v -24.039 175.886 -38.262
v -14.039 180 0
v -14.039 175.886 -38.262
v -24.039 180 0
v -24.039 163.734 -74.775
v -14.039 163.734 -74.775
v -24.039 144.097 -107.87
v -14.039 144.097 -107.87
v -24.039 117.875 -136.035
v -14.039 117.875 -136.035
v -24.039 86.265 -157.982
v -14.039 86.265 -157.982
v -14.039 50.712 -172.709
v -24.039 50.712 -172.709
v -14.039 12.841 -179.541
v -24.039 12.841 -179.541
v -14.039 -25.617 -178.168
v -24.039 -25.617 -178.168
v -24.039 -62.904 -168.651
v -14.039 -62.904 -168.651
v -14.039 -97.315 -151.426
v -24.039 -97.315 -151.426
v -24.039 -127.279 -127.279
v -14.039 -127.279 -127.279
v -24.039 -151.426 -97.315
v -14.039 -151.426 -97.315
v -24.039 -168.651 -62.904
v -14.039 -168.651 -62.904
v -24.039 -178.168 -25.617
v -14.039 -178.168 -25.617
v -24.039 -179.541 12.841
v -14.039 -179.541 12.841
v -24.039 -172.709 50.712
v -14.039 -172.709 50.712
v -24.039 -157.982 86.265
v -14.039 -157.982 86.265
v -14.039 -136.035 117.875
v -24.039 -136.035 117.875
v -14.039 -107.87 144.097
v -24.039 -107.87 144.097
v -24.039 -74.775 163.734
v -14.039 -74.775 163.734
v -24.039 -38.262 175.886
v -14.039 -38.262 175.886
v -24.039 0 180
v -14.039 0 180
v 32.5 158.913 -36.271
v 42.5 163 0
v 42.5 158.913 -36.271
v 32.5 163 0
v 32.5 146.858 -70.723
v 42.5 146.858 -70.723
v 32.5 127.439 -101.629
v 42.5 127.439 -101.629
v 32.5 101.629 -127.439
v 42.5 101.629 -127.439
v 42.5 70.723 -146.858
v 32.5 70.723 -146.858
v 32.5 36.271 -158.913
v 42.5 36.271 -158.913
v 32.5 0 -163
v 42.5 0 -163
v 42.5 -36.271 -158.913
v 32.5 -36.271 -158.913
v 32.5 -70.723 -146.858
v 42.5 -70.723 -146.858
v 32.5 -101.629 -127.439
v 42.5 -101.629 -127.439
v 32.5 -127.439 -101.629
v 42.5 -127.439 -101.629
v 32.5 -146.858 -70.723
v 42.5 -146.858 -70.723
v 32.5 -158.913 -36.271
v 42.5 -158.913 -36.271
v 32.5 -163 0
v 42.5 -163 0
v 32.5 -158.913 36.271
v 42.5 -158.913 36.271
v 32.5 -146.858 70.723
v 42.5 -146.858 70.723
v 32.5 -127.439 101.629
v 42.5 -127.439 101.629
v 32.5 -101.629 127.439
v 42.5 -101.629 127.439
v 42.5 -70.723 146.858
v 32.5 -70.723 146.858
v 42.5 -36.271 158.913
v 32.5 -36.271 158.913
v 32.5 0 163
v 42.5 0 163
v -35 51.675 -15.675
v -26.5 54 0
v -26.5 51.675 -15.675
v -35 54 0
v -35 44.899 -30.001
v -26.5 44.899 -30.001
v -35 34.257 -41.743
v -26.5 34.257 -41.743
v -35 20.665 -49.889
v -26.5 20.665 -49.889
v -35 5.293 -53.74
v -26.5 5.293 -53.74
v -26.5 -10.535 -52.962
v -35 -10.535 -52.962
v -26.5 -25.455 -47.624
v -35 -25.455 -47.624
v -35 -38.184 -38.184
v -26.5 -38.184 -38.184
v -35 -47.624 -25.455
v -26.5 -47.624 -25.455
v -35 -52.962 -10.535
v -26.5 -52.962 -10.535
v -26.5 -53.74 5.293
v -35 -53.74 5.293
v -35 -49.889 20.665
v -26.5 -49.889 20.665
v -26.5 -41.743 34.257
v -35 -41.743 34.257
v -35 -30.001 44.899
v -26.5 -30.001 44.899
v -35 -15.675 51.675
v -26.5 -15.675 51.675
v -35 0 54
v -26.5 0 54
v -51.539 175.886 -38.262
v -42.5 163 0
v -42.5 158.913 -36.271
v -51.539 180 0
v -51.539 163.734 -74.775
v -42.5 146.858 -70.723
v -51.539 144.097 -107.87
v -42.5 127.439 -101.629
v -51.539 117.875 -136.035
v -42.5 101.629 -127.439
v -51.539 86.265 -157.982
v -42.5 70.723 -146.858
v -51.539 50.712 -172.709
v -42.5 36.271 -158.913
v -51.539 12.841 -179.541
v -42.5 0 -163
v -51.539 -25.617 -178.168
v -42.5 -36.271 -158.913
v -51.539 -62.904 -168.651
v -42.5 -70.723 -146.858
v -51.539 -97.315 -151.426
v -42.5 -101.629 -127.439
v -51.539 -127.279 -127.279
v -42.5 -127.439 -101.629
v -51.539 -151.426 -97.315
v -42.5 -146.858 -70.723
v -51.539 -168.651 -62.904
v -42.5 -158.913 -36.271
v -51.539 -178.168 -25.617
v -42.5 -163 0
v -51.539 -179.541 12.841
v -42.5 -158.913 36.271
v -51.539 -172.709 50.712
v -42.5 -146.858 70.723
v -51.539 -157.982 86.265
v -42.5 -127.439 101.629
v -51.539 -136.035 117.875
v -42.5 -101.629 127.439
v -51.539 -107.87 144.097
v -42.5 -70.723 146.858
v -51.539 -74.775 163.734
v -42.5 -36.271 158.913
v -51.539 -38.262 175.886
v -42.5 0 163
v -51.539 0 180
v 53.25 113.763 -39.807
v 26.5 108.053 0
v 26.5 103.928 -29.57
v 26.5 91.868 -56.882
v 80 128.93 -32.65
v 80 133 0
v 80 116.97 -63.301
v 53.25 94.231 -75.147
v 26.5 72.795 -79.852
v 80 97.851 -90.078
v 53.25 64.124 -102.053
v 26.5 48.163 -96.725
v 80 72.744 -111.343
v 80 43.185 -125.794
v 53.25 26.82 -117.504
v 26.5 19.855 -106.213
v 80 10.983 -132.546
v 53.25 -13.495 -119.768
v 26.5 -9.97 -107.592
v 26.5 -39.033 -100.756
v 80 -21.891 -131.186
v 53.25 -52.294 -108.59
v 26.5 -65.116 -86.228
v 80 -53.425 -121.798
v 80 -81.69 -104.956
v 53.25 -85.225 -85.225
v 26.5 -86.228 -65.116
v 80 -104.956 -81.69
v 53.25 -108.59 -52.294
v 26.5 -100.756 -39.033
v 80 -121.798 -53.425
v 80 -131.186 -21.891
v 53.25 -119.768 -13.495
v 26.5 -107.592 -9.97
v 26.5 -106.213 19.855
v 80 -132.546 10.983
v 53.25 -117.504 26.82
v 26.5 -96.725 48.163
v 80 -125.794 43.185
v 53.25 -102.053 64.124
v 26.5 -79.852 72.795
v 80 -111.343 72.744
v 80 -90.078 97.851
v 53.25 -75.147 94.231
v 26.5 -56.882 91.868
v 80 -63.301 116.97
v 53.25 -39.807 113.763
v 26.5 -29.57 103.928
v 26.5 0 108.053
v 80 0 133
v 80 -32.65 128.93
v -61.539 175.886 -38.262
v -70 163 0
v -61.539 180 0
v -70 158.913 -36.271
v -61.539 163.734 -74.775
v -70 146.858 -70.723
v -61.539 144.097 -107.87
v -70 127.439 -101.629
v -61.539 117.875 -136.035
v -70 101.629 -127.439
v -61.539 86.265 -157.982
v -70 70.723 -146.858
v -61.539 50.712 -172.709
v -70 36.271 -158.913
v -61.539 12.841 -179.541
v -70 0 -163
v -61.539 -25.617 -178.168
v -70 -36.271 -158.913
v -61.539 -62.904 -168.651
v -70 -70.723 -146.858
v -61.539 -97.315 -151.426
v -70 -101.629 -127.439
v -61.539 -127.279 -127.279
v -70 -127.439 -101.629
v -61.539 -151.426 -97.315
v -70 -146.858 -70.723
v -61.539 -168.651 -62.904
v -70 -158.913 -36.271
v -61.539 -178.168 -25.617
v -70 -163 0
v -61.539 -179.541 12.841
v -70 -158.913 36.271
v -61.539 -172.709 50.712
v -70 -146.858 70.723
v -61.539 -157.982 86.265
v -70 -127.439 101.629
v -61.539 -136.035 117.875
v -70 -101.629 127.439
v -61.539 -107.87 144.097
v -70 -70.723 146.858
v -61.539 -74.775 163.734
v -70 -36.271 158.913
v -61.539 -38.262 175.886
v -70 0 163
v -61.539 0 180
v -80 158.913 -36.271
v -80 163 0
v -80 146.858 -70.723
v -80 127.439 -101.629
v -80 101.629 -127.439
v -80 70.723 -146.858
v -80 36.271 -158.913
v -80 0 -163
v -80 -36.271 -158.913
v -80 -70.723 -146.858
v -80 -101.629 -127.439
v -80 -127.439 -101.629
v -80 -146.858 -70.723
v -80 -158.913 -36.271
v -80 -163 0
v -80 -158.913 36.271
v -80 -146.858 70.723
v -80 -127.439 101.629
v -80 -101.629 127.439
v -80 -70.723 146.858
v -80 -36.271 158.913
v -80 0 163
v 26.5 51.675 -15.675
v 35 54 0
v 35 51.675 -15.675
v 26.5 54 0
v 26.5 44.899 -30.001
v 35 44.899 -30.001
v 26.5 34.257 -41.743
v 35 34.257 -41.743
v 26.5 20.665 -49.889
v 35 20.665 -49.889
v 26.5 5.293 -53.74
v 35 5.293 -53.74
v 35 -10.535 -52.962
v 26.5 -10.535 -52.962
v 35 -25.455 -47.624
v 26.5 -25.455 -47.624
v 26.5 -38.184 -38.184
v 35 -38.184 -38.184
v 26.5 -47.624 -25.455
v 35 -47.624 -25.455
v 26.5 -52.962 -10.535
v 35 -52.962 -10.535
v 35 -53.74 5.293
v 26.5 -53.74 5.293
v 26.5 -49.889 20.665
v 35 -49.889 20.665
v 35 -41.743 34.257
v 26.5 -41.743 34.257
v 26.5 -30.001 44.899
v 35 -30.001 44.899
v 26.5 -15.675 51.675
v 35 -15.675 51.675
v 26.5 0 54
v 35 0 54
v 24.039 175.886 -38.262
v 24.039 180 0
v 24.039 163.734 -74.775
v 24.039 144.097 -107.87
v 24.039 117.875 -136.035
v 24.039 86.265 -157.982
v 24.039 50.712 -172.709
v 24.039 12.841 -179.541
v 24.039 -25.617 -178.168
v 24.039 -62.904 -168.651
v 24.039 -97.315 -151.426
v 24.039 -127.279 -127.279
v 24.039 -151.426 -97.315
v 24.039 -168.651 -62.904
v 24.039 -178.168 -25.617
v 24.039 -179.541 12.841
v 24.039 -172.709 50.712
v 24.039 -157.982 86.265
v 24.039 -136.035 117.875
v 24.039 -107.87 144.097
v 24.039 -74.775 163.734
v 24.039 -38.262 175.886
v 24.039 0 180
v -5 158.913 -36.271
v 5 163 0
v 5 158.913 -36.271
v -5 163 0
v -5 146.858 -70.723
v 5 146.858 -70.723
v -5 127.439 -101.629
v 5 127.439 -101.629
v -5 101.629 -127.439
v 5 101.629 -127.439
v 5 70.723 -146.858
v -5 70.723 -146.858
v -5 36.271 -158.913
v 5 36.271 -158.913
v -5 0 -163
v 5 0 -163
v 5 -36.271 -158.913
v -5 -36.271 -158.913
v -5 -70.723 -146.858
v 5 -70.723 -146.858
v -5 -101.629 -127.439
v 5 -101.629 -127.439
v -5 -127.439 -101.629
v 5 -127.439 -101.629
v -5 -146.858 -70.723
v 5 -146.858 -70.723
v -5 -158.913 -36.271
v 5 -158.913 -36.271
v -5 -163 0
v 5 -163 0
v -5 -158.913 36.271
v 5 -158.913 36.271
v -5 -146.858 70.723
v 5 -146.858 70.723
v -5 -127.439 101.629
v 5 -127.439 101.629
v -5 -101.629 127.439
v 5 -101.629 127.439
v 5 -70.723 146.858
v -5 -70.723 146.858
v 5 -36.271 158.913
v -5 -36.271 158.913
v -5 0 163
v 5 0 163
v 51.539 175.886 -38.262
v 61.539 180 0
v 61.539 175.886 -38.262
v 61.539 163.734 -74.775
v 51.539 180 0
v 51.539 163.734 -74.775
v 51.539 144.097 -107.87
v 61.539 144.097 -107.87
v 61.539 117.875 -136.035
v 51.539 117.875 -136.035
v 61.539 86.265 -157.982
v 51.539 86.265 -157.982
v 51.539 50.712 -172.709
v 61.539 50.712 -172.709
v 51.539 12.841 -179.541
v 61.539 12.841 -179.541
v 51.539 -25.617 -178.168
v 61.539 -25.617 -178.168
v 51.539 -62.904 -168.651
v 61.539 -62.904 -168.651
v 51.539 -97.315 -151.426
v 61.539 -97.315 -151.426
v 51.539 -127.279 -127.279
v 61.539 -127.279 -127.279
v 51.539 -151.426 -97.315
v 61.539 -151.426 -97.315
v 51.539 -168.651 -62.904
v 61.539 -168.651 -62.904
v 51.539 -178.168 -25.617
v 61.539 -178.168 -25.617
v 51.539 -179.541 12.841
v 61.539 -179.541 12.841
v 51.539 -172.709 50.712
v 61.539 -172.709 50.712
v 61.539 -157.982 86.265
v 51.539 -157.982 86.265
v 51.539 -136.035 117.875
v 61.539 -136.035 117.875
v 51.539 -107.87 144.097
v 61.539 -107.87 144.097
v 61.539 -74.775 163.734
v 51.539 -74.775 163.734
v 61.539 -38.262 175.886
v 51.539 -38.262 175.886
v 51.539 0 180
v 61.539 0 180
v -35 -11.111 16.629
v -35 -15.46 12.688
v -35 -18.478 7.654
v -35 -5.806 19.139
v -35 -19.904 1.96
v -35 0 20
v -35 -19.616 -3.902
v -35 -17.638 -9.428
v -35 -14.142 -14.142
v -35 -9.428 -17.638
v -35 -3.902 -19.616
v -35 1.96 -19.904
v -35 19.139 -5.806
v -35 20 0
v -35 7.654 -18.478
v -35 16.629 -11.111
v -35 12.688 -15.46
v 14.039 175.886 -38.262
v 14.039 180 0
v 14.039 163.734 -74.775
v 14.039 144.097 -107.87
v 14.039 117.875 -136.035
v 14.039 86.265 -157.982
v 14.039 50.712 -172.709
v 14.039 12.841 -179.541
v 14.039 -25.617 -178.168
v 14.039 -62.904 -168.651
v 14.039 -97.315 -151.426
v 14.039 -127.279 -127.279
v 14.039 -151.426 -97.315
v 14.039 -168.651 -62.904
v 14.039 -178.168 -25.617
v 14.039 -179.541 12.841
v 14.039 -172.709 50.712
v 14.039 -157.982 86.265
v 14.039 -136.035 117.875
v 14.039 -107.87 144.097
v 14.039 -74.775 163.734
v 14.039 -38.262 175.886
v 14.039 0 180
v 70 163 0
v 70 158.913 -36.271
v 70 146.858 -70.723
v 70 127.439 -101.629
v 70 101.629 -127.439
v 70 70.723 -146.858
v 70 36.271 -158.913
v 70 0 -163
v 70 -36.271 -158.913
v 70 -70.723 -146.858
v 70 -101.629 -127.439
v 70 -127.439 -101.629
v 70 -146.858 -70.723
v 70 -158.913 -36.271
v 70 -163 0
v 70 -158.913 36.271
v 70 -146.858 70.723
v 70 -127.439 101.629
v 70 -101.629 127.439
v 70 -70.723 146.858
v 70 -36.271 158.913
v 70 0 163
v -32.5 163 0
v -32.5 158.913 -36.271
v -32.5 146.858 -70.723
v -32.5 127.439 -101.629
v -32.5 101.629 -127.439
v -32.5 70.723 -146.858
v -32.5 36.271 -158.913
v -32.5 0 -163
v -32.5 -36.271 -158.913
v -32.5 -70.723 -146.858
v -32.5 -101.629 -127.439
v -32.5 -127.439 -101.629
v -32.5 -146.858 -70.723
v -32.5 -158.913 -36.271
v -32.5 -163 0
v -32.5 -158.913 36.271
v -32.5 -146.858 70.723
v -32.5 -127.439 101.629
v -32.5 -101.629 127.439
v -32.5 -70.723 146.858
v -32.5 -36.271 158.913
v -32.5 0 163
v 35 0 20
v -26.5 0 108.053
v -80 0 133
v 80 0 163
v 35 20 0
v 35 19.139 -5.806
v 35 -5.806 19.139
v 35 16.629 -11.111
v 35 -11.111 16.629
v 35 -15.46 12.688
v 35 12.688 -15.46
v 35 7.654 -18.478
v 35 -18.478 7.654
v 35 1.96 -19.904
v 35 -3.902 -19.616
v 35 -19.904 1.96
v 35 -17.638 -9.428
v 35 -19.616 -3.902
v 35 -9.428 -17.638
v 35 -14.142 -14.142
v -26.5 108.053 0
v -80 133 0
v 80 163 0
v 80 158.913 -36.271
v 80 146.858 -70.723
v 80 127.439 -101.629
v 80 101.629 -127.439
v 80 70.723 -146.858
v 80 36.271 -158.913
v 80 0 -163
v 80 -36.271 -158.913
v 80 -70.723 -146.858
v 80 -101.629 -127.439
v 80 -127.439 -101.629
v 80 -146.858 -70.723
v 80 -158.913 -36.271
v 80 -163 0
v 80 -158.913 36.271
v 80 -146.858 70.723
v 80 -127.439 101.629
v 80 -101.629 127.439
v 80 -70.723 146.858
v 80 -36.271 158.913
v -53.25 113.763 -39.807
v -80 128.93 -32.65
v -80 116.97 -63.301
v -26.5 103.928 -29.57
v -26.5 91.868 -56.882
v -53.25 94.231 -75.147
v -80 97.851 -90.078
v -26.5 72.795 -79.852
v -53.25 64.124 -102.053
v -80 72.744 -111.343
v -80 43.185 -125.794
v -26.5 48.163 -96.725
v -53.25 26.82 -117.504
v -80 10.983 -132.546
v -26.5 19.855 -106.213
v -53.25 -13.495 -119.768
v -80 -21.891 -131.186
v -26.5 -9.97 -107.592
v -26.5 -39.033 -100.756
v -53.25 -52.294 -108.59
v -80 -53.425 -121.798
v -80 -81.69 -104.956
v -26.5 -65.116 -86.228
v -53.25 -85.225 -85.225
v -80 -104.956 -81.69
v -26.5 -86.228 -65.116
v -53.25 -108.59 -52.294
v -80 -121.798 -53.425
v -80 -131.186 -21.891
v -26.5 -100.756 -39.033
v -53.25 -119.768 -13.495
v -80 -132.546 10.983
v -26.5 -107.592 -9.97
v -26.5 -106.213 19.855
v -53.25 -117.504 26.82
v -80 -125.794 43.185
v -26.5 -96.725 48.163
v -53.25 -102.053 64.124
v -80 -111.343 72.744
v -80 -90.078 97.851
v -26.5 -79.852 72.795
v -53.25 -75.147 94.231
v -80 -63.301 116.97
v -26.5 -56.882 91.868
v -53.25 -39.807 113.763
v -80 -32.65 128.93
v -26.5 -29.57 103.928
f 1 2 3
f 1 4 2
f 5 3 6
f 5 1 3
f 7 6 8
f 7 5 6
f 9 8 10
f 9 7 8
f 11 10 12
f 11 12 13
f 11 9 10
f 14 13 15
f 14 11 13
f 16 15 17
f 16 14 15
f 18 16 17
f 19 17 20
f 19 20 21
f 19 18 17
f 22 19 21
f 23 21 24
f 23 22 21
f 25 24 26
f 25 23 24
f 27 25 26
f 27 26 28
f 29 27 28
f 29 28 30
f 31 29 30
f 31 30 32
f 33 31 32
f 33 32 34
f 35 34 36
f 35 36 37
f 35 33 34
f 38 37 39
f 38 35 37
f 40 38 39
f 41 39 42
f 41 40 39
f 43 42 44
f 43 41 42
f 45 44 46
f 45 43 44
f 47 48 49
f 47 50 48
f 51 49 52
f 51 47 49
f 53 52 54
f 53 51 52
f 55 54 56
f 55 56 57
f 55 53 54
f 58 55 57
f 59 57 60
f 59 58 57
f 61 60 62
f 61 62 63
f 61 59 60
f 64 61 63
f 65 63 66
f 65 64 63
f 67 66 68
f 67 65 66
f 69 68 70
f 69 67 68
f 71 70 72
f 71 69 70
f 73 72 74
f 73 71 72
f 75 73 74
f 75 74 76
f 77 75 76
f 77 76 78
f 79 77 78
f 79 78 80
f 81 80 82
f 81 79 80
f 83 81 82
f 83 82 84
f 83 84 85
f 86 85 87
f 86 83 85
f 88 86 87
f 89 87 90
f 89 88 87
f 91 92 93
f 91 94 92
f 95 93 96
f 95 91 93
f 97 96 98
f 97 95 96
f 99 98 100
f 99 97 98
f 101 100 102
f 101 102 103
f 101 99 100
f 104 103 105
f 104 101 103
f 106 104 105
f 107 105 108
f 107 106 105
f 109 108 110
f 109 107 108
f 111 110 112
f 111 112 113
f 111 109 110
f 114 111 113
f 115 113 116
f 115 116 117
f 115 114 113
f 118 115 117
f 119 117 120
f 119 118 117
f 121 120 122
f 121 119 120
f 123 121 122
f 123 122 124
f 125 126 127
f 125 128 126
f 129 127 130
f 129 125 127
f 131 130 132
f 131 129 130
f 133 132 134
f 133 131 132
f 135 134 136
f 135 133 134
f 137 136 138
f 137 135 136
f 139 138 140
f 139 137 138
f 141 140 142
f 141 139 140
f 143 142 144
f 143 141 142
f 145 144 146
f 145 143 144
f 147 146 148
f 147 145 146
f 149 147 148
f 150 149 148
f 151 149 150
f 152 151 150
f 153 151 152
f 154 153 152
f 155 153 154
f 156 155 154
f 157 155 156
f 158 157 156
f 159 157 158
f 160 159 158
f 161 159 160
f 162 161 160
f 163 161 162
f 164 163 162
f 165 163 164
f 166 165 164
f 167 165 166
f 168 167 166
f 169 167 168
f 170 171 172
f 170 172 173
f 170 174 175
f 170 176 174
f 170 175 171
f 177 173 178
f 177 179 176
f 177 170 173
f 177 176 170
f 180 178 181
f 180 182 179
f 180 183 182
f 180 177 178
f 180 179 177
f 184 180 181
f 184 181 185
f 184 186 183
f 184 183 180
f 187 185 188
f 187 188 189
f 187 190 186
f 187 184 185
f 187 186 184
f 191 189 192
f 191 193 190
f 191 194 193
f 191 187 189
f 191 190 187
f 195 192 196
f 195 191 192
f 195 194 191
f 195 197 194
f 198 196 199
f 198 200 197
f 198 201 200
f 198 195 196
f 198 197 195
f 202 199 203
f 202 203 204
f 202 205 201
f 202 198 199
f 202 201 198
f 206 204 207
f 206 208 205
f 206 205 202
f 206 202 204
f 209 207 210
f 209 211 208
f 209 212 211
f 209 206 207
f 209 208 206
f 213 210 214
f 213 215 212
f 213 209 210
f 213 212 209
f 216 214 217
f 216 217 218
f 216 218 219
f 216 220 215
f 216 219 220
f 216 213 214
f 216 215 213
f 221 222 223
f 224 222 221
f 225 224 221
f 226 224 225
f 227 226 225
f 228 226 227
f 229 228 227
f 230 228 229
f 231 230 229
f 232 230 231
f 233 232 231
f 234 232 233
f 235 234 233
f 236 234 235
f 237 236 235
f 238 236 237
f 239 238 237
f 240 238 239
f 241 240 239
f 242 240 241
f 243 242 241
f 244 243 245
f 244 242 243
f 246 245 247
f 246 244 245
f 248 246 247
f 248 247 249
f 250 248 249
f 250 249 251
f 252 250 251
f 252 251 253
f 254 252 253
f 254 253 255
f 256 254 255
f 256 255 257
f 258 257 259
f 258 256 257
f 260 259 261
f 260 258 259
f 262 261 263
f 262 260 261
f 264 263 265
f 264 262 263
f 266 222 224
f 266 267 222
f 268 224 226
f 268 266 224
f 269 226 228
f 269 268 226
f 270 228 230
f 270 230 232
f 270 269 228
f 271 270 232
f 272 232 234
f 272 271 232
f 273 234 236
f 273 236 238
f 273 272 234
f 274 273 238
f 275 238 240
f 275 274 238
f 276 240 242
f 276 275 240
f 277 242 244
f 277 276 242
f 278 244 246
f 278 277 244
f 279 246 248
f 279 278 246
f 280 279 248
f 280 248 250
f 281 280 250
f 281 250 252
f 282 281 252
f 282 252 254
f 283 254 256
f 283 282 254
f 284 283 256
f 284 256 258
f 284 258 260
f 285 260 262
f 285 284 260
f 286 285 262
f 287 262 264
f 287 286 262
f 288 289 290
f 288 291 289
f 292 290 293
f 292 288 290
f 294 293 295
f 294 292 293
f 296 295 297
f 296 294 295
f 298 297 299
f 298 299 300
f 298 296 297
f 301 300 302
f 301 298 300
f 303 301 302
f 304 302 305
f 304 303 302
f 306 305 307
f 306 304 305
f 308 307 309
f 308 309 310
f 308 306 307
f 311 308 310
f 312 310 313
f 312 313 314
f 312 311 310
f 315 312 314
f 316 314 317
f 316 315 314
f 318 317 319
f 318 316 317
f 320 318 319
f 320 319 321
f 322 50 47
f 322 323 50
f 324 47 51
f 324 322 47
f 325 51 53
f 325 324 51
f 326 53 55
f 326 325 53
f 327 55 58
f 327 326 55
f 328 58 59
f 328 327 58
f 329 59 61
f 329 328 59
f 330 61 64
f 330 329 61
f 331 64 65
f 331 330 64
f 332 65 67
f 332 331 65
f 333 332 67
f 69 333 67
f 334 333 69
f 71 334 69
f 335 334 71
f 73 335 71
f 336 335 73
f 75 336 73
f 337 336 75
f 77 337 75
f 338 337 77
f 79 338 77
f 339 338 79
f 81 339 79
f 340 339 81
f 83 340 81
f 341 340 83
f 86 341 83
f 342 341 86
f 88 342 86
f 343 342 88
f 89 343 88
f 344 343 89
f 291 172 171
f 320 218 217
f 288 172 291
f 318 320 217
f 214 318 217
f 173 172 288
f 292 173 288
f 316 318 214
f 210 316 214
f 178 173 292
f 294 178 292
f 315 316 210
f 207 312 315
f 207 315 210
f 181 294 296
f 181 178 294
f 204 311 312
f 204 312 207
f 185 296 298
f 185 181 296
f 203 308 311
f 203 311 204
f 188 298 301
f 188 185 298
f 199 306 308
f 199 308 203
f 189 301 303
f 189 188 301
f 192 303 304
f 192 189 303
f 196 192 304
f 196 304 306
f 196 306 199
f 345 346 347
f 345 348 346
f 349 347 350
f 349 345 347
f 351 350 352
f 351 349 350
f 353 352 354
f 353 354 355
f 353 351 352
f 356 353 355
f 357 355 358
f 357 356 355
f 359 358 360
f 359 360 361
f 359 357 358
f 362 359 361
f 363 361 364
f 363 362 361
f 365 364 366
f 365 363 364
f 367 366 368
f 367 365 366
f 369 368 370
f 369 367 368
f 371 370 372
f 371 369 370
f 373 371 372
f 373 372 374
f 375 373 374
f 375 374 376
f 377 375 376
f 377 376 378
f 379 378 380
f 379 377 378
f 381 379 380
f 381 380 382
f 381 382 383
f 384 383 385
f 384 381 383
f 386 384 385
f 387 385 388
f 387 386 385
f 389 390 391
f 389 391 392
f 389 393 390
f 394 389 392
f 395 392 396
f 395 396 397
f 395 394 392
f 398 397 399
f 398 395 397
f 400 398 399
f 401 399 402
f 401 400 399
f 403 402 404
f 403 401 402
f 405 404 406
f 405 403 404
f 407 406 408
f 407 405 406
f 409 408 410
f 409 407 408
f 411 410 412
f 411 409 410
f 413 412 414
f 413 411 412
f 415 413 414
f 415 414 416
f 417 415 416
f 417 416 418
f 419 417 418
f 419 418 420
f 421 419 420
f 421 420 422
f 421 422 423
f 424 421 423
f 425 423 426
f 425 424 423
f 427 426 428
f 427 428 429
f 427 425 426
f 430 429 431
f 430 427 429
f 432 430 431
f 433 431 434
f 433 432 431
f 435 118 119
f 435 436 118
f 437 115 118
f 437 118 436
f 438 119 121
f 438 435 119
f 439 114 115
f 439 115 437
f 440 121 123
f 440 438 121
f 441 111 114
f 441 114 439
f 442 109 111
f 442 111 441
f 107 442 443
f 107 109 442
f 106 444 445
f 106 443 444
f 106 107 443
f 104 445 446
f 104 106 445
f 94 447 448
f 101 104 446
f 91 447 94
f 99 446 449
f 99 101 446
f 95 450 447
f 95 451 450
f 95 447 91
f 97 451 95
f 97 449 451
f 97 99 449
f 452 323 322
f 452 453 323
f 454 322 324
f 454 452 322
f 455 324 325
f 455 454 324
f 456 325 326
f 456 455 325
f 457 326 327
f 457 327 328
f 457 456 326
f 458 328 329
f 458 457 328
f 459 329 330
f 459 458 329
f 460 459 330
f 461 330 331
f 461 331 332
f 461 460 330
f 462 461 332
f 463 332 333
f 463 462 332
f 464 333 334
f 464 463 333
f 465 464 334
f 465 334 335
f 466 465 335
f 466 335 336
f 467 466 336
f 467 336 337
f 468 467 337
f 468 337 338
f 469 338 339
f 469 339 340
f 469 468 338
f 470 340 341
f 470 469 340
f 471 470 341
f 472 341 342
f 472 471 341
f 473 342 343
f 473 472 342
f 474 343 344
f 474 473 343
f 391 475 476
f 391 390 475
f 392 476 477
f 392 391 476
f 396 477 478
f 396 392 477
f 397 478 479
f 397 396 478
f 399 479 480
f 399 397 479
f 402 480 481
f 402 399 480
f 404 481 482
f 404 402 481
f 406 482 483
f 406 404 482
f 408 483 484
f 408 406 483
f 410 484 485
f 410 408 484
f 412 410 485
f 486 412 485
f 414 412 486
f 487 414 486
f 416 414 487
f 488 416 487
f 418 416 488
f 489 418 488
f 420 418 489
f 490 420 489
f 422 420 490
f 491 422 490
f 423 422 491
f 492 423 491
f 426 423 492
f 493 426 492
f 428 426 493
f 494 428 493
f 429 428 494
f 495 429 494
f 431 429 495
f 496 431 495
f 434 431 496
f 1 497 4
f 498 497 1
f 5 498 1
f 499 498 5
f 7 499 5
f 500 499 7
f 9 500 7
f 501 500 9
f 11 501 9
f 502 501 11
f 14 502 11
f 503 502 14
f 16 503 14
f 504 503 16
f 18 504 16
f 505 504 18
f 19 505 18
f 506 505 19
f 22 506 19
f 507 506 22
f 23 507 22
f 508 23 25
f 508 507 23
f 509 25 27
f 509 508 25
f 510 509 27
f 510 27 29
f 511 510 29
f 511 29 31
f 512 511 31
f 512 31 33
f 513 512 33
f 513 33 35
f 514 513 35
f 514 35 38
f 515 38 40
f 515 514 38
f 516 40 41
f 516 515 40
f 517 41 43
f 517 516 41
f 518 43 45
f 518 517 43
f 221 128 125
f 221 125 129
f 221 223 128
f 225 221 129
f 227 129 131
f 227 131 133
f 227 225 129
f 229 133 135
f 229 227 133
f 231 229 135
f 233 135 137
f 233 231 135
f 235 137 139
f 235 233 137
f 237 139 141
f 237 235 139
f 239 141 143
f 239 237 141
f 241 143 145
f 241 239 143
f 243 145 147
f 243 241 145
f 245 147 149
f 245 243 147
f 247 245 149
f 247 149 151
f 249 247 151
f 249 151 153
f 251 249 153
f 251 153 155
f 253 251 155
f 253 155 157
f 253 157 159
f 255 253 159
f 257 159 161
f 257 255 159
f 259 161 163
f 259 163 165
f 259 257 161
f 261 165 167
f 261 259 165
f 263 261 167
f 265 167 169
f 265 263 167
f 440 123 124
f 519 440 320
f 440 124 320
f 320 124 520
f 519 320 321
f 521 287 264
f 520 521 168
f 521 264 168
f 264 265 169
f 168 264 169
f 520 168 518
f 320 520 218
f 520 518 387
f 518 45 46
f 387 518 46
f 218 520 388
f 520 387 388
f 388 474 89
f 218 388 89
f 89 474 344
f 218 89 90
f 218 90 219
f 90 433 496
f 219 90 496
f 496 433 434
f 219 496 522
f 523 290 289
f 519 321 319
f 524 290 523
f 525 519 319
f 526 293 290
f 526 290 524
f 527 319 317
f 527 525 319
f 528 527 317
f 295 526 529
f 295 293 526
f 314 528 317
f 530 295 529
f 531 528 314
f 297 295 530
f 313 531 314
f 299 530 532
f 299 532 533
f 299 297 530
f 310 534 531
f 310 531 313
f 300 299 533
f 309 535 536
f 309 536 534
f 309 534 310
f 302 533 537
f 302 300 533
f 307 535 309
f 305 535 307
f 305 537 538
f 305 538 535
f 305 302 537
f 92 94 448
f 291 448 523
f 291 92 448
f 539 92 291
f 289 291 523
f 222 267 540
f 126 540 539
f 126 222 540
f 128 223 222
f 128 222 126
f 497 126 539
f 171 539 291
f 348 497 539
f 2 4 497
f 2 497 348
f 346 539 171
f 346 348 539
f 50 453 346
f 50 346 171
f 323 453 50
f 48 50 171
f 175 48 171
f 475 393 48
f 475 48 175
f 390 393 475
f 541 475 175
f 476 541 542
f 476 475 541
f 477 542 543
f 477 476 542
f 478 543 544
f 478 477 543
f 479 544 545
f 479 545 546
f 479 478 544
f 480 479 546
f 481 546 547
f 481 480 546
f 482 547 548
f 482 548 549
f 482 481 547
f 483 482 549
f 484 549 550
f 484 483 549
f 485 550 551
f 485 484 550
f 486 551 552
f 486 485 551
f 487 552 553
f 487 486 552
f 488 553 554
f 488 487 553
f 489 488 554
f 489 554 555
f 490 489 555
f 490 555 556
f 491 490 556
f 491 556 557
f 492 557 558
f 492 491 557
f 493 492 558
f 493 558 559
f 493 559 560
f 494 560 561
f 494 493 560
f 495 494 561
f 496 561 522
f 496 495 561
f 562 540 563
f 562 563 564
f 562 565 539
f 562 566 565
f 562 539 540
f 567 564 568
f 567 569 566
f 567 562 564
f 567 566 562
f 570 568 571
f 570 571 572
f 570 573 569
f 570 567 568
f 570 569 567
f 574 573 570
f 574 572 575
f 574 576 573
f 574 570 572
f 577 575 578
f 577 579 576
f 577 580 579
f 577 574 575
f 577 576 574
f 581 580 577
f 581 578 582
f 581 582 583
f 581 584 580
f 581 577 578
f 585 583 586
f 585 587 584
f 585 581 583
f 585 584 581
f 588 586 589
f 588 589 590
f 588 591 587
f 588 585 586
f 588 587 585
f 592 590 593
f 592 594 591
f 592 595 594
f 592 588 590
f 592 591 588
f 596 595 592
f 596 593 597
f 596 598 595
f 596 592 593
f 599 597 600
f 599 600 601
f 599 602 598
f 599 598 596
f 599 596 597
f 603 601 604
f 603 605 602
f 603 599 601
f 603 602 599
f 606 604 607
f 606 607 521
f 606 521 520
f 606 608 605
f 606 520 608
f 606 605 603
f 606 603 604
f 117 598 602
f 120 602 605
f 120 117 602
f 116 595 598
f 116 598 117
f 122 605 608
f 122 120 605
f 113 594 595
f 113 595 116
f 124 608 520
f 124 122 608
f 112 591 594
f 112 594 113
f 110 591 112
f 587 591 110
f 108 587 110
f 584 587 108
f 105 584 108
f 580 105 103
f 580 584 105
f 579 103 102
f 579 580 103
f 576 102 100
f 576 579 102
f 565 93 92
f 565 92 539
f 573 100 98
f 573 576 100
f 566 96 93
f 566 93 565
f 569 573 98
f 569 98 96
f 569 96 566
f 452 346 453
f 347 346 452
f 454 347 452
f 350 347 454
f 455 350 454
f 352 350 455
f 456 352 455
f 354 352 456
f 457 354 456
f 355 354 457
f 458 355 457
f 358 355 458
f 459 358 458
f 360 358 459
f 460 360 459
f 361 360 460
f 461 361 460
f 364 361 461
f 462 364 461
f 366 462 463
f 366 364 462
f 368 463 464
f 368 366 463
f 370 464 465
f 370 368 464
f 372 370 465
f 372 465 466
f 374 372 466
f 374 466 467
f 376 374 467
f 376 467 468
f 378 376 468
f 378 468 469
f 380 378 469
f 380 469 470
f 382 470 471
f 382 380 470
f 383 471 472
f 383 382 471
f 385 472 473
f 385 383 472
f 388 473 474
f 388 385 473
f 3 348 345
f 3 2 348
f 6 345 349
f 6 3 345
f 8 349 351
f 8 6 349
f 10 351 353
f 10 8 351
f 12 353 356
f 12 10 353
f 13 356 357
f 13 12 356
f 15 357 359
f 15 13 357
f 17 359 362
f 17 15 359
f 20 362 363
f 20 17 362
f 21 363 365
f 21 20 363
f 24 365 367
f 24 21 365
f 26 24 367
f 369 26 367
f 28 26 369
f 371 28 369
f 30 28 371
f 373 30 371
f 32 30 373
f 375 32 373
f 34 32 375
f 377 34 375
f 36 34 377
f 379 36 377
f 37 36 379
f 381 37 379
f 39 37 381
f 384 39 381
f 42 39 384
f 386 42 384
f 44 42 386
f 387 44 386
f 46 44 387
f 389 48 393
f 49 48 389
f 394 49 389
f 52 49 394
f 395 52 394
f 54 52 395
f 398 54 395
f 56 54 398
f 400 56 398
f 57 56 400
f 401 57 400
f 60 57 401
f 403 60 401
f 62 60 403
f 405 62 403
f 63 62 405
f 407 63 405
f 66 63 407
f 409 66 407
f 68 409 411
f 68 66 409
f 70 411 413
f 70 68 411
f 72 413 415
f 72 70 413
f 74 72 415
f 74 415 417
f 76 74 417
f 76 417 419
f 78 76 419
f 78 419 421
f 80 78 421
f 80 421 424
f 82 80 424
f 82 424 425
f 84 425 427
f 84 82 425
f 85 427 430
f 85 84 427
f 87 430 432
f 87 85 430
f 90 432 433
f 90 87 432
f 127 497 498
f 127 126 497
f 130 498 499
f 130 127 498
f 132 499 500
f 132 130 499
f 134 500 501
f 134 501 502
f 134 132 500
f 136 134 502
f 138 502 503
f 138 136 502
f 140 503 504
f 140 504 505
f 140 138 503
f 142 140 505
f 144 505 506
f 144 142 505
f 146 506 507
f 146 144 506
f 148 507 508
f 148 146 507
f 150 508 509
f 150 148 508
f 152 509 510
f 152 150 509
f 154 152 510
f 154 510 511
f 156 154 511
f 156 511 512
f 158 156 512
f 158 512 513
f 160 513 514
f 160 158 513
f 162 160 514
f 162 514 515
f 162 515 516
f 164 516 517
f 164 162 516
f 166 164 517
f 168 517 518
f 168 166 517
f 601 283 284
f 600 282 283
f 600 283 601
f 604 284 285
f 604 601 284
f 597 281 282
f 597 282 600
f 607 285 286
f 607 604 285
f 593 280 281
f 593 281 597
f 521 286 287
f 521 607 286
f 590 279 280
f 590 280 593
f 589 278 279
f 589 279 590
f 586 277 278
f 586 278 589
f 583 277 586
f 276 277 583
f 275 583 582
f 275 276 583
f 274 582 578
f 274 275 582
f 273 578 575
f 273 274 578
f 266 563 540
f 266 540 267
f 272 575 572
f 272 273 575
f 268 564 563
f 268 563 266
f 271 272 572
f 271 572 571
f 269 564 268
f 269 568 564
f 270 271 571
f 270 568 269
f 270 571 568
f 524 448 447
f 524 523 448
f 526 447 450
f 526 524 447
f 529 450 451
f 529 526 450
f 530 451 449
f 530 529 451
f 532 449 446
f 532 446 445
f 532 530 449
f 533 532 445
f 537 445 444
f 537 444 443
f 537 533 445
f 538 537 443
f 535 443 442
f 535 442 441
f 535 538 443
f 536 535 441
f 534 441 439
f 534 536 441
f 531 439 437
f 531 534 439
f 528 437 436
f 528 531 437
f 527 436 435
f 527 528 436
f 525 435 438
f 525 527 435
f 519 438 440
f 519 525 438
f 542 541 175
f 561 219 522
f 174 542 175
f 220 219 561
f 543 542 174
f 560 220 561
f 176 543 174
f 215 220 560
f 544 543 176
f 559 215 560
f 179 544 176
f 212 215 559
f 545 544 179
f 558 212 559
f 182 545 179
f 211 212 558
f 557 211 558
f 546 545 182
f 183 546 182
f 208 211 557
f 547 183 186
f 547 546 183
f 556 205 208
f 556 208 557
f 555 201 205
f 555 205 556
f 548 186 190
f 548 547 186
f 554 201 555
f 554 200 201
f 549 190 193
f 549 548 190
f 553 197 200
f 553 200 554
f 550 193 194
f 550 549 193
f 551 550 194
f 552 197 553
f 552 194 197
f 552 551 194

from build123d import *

# Parameters (mm, degrees)
REVOLVE1_ANGLE = 270


with BuildPart() as part:
    # Sketch1 → Revolve1 (revolve)
    with BuildSketch(Plane.XY):
        Polygon((-35, 20), (35, 20), (35, 54), (26.5, 54), (26.5, 108.052540289), (80, 133), (80, 163), (70, 163), (61.539060338, 180), (51.539060338, 180), (42.5, 163), (32.5, 163), (24.039060338, 180), (14.039060338, 180), (5, 163), (-5, 163), (-14.039060338, 180), (-24.039060338, 180), (-32.5, 163), (-42.5, 163), (-51.539060338, 180), (-61.539060338, 180), (-70, 163), (-80, 163), (-80, 133), (-26.5, 108.052540289), (-26.5, 54), (-35, 54), align=None)
    revolve(axis=Axis((0, 0, 0), (-1, 0, 0)), revolution_arc=REVOLVE1_ANGLE)


solid = part.part
